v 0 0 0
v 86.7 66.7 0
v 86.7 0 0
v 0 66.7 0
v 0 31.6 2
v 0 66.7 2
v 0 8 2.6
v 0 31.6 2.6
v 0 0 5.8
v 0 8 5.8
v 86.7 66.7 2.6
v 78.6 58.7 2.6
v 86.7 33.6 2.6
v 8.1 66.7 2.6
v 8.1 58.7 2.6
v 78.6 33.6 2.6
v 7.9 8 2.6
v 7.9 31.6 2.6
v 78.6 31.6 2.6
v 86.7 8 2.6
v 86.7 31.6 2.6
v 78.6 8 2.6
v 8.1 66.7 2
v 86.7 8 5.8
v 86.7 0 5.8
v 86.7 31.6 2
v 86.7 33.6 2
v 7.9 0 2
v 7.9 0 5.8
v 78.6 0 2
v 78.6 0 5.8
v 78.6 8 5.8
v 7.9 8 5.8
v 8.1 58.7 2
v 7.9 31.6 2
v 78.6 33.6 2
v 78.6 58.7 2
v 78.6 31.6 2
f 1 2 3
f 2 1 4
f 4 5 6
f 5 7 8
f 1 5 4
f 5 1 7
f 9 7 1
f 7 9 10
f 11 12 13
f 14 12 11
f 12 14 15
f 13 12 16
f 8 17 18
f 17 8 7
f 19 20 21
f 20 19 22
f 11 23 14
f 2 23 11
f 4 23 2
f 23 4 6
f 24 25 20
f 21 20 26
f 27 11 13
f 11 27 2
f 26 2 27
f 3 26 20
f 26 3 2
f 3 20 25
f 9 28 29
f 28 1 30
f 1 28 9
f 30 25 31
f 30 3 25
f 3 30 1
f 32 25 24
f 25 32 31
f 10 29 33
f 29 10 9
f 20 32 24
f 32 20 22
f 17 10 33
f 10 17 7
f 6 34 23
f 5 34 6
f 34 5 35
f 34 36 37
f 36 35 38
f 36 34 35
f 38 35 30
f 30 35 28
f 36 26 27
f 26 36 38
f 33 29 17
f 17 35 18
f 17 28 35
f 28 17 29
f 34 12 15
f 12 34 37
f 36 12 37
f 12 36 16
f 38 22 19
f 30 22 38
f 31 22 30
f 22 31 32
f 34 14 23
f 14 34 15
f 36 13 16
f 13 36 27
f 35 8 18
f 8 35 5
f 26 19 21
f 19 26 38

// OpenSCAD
// file: ../flap_dimensions.scad
/*
   Copyright 2018 Scott Bezek and the splitflap contributors

   Licensed under the Apache License, Version 2.0 (the "License");
   you may not use this file except in compliance with the License.
   You may obtain a copy of the License at

       http://www.apache.org/licenses/LICENSE-2.0

   Unless required by applicable law or agreed to in writing, software
   distributed under the License is distributed on an "AS IS" BASIS,
   WITHOUT WARRANTIES OR CONDITIONS OF ANY KIND, either express or implied.
   See the License for the specific language governing permissions and
   limitations under the License.
*/

flap_width = 70.5;
flap_height = 26;
flap_thickness = 0.3; // 30 mil
flap_corner_radius = 3.1; // 2.88-3.48mm (used just for display)

flap_notch_height_auto = false;
flap_notch_height_default = 7.2;

flap_notch_height = (flap_notch_height_auto == true) ? sqrt(spool_outer_radius*spool_outer_radius - flap_pitch_radius*flap_pitch_radius) : flap_notch_height_default;

flap_notch_depth = 2;

flap_pin_width = 1.2;
// main file
/*
   Copyright 2020 Scott Bezek and the splitflap contributors

   Licensed under the Apache License, Version 2.0 (the "License");
   you may not use this file except in compliance with the License.
   You may obtain a copy of the License at

       http://www.apache.org/licenses/LICENSE-2.0

   Unless required by applicable law or agreed to in writing, software
   distributed under the License is distributed on an "AS IS" BASIS,
   WITHOUT WARRANTIES OR CONDITIONS OF ANY KIND, either express or implied.
   See the License for the specific language governing permissions and
   limitations under the License.
*/

include<../flap_dimensions.scad>

print_tolerance = 0.1;
eps = 0.1;
jig_thickness = 2.0; // Vertical thickness of the jig base.
jig_border = 8.0; // horizontal extent of the jig outside the flap size.
flap_slot_depth = 2 * flap_thickness; // depth of the recess the flap sits in.
cutting_slot_width = 2.0; // Relief in the border for the blade to start and stop in.

jig_width = jig_border*2 + print_tolerance * 2 + flap_width;

ruler_width = 24.6;
ruler_depth = 1.6;
ruler_backstop_height = ruler_depth * 2;

difference() {
    union() {
        // Main body of the jig
        linear_extrude(height=jig_thickness + flap_slot_depth) {
            square([jig_width,jig_border*2 + print_tolerance + ruler_width + flap_height]);
        }
        // Backstop for ruler/cutting guide
        linear_extrude(height=jig_thickness + flap_slot_depth + ruler_backstop_height) {
            square(size=[jig_border*2 + print_tolerance * 2 + flap_width, jig_border]);
        }
    }
    union() {
        translate([jig_border - print_tolerance,-eps,jig_thickness]) {
            // Main area for card to sit into
            linear_extrude(height=flap_slot_depth + ruler_backstop_height + eps) {
                square([flap_width + 2 * print_tolerance, flap_height + print_tolerance + ruler_width + jig_border + eps]);
            }
        }
        translate([-eps ,jig_border + ruler_width, jig_thickness]) {
            // remove material from the left side so only the top and right sides are braced
            linear_extrude(height=flap_slot_depth + eps) {
                square([jig_border + print_tolerance + eps, flap_height + print_tolerance + jig_border + eps]);
            }
        }
        translate([-eps, jig_border + ruler_width - cutting_slot_width / 2, jig_thickness]) {
            // Relieve a slot for the blade to start and finish in
            linear_extrude(height=flap_slot_depth + eps) {
                square([jig_width + 2*eps,cutting_slot_width]);
            }
        }
    }
}
